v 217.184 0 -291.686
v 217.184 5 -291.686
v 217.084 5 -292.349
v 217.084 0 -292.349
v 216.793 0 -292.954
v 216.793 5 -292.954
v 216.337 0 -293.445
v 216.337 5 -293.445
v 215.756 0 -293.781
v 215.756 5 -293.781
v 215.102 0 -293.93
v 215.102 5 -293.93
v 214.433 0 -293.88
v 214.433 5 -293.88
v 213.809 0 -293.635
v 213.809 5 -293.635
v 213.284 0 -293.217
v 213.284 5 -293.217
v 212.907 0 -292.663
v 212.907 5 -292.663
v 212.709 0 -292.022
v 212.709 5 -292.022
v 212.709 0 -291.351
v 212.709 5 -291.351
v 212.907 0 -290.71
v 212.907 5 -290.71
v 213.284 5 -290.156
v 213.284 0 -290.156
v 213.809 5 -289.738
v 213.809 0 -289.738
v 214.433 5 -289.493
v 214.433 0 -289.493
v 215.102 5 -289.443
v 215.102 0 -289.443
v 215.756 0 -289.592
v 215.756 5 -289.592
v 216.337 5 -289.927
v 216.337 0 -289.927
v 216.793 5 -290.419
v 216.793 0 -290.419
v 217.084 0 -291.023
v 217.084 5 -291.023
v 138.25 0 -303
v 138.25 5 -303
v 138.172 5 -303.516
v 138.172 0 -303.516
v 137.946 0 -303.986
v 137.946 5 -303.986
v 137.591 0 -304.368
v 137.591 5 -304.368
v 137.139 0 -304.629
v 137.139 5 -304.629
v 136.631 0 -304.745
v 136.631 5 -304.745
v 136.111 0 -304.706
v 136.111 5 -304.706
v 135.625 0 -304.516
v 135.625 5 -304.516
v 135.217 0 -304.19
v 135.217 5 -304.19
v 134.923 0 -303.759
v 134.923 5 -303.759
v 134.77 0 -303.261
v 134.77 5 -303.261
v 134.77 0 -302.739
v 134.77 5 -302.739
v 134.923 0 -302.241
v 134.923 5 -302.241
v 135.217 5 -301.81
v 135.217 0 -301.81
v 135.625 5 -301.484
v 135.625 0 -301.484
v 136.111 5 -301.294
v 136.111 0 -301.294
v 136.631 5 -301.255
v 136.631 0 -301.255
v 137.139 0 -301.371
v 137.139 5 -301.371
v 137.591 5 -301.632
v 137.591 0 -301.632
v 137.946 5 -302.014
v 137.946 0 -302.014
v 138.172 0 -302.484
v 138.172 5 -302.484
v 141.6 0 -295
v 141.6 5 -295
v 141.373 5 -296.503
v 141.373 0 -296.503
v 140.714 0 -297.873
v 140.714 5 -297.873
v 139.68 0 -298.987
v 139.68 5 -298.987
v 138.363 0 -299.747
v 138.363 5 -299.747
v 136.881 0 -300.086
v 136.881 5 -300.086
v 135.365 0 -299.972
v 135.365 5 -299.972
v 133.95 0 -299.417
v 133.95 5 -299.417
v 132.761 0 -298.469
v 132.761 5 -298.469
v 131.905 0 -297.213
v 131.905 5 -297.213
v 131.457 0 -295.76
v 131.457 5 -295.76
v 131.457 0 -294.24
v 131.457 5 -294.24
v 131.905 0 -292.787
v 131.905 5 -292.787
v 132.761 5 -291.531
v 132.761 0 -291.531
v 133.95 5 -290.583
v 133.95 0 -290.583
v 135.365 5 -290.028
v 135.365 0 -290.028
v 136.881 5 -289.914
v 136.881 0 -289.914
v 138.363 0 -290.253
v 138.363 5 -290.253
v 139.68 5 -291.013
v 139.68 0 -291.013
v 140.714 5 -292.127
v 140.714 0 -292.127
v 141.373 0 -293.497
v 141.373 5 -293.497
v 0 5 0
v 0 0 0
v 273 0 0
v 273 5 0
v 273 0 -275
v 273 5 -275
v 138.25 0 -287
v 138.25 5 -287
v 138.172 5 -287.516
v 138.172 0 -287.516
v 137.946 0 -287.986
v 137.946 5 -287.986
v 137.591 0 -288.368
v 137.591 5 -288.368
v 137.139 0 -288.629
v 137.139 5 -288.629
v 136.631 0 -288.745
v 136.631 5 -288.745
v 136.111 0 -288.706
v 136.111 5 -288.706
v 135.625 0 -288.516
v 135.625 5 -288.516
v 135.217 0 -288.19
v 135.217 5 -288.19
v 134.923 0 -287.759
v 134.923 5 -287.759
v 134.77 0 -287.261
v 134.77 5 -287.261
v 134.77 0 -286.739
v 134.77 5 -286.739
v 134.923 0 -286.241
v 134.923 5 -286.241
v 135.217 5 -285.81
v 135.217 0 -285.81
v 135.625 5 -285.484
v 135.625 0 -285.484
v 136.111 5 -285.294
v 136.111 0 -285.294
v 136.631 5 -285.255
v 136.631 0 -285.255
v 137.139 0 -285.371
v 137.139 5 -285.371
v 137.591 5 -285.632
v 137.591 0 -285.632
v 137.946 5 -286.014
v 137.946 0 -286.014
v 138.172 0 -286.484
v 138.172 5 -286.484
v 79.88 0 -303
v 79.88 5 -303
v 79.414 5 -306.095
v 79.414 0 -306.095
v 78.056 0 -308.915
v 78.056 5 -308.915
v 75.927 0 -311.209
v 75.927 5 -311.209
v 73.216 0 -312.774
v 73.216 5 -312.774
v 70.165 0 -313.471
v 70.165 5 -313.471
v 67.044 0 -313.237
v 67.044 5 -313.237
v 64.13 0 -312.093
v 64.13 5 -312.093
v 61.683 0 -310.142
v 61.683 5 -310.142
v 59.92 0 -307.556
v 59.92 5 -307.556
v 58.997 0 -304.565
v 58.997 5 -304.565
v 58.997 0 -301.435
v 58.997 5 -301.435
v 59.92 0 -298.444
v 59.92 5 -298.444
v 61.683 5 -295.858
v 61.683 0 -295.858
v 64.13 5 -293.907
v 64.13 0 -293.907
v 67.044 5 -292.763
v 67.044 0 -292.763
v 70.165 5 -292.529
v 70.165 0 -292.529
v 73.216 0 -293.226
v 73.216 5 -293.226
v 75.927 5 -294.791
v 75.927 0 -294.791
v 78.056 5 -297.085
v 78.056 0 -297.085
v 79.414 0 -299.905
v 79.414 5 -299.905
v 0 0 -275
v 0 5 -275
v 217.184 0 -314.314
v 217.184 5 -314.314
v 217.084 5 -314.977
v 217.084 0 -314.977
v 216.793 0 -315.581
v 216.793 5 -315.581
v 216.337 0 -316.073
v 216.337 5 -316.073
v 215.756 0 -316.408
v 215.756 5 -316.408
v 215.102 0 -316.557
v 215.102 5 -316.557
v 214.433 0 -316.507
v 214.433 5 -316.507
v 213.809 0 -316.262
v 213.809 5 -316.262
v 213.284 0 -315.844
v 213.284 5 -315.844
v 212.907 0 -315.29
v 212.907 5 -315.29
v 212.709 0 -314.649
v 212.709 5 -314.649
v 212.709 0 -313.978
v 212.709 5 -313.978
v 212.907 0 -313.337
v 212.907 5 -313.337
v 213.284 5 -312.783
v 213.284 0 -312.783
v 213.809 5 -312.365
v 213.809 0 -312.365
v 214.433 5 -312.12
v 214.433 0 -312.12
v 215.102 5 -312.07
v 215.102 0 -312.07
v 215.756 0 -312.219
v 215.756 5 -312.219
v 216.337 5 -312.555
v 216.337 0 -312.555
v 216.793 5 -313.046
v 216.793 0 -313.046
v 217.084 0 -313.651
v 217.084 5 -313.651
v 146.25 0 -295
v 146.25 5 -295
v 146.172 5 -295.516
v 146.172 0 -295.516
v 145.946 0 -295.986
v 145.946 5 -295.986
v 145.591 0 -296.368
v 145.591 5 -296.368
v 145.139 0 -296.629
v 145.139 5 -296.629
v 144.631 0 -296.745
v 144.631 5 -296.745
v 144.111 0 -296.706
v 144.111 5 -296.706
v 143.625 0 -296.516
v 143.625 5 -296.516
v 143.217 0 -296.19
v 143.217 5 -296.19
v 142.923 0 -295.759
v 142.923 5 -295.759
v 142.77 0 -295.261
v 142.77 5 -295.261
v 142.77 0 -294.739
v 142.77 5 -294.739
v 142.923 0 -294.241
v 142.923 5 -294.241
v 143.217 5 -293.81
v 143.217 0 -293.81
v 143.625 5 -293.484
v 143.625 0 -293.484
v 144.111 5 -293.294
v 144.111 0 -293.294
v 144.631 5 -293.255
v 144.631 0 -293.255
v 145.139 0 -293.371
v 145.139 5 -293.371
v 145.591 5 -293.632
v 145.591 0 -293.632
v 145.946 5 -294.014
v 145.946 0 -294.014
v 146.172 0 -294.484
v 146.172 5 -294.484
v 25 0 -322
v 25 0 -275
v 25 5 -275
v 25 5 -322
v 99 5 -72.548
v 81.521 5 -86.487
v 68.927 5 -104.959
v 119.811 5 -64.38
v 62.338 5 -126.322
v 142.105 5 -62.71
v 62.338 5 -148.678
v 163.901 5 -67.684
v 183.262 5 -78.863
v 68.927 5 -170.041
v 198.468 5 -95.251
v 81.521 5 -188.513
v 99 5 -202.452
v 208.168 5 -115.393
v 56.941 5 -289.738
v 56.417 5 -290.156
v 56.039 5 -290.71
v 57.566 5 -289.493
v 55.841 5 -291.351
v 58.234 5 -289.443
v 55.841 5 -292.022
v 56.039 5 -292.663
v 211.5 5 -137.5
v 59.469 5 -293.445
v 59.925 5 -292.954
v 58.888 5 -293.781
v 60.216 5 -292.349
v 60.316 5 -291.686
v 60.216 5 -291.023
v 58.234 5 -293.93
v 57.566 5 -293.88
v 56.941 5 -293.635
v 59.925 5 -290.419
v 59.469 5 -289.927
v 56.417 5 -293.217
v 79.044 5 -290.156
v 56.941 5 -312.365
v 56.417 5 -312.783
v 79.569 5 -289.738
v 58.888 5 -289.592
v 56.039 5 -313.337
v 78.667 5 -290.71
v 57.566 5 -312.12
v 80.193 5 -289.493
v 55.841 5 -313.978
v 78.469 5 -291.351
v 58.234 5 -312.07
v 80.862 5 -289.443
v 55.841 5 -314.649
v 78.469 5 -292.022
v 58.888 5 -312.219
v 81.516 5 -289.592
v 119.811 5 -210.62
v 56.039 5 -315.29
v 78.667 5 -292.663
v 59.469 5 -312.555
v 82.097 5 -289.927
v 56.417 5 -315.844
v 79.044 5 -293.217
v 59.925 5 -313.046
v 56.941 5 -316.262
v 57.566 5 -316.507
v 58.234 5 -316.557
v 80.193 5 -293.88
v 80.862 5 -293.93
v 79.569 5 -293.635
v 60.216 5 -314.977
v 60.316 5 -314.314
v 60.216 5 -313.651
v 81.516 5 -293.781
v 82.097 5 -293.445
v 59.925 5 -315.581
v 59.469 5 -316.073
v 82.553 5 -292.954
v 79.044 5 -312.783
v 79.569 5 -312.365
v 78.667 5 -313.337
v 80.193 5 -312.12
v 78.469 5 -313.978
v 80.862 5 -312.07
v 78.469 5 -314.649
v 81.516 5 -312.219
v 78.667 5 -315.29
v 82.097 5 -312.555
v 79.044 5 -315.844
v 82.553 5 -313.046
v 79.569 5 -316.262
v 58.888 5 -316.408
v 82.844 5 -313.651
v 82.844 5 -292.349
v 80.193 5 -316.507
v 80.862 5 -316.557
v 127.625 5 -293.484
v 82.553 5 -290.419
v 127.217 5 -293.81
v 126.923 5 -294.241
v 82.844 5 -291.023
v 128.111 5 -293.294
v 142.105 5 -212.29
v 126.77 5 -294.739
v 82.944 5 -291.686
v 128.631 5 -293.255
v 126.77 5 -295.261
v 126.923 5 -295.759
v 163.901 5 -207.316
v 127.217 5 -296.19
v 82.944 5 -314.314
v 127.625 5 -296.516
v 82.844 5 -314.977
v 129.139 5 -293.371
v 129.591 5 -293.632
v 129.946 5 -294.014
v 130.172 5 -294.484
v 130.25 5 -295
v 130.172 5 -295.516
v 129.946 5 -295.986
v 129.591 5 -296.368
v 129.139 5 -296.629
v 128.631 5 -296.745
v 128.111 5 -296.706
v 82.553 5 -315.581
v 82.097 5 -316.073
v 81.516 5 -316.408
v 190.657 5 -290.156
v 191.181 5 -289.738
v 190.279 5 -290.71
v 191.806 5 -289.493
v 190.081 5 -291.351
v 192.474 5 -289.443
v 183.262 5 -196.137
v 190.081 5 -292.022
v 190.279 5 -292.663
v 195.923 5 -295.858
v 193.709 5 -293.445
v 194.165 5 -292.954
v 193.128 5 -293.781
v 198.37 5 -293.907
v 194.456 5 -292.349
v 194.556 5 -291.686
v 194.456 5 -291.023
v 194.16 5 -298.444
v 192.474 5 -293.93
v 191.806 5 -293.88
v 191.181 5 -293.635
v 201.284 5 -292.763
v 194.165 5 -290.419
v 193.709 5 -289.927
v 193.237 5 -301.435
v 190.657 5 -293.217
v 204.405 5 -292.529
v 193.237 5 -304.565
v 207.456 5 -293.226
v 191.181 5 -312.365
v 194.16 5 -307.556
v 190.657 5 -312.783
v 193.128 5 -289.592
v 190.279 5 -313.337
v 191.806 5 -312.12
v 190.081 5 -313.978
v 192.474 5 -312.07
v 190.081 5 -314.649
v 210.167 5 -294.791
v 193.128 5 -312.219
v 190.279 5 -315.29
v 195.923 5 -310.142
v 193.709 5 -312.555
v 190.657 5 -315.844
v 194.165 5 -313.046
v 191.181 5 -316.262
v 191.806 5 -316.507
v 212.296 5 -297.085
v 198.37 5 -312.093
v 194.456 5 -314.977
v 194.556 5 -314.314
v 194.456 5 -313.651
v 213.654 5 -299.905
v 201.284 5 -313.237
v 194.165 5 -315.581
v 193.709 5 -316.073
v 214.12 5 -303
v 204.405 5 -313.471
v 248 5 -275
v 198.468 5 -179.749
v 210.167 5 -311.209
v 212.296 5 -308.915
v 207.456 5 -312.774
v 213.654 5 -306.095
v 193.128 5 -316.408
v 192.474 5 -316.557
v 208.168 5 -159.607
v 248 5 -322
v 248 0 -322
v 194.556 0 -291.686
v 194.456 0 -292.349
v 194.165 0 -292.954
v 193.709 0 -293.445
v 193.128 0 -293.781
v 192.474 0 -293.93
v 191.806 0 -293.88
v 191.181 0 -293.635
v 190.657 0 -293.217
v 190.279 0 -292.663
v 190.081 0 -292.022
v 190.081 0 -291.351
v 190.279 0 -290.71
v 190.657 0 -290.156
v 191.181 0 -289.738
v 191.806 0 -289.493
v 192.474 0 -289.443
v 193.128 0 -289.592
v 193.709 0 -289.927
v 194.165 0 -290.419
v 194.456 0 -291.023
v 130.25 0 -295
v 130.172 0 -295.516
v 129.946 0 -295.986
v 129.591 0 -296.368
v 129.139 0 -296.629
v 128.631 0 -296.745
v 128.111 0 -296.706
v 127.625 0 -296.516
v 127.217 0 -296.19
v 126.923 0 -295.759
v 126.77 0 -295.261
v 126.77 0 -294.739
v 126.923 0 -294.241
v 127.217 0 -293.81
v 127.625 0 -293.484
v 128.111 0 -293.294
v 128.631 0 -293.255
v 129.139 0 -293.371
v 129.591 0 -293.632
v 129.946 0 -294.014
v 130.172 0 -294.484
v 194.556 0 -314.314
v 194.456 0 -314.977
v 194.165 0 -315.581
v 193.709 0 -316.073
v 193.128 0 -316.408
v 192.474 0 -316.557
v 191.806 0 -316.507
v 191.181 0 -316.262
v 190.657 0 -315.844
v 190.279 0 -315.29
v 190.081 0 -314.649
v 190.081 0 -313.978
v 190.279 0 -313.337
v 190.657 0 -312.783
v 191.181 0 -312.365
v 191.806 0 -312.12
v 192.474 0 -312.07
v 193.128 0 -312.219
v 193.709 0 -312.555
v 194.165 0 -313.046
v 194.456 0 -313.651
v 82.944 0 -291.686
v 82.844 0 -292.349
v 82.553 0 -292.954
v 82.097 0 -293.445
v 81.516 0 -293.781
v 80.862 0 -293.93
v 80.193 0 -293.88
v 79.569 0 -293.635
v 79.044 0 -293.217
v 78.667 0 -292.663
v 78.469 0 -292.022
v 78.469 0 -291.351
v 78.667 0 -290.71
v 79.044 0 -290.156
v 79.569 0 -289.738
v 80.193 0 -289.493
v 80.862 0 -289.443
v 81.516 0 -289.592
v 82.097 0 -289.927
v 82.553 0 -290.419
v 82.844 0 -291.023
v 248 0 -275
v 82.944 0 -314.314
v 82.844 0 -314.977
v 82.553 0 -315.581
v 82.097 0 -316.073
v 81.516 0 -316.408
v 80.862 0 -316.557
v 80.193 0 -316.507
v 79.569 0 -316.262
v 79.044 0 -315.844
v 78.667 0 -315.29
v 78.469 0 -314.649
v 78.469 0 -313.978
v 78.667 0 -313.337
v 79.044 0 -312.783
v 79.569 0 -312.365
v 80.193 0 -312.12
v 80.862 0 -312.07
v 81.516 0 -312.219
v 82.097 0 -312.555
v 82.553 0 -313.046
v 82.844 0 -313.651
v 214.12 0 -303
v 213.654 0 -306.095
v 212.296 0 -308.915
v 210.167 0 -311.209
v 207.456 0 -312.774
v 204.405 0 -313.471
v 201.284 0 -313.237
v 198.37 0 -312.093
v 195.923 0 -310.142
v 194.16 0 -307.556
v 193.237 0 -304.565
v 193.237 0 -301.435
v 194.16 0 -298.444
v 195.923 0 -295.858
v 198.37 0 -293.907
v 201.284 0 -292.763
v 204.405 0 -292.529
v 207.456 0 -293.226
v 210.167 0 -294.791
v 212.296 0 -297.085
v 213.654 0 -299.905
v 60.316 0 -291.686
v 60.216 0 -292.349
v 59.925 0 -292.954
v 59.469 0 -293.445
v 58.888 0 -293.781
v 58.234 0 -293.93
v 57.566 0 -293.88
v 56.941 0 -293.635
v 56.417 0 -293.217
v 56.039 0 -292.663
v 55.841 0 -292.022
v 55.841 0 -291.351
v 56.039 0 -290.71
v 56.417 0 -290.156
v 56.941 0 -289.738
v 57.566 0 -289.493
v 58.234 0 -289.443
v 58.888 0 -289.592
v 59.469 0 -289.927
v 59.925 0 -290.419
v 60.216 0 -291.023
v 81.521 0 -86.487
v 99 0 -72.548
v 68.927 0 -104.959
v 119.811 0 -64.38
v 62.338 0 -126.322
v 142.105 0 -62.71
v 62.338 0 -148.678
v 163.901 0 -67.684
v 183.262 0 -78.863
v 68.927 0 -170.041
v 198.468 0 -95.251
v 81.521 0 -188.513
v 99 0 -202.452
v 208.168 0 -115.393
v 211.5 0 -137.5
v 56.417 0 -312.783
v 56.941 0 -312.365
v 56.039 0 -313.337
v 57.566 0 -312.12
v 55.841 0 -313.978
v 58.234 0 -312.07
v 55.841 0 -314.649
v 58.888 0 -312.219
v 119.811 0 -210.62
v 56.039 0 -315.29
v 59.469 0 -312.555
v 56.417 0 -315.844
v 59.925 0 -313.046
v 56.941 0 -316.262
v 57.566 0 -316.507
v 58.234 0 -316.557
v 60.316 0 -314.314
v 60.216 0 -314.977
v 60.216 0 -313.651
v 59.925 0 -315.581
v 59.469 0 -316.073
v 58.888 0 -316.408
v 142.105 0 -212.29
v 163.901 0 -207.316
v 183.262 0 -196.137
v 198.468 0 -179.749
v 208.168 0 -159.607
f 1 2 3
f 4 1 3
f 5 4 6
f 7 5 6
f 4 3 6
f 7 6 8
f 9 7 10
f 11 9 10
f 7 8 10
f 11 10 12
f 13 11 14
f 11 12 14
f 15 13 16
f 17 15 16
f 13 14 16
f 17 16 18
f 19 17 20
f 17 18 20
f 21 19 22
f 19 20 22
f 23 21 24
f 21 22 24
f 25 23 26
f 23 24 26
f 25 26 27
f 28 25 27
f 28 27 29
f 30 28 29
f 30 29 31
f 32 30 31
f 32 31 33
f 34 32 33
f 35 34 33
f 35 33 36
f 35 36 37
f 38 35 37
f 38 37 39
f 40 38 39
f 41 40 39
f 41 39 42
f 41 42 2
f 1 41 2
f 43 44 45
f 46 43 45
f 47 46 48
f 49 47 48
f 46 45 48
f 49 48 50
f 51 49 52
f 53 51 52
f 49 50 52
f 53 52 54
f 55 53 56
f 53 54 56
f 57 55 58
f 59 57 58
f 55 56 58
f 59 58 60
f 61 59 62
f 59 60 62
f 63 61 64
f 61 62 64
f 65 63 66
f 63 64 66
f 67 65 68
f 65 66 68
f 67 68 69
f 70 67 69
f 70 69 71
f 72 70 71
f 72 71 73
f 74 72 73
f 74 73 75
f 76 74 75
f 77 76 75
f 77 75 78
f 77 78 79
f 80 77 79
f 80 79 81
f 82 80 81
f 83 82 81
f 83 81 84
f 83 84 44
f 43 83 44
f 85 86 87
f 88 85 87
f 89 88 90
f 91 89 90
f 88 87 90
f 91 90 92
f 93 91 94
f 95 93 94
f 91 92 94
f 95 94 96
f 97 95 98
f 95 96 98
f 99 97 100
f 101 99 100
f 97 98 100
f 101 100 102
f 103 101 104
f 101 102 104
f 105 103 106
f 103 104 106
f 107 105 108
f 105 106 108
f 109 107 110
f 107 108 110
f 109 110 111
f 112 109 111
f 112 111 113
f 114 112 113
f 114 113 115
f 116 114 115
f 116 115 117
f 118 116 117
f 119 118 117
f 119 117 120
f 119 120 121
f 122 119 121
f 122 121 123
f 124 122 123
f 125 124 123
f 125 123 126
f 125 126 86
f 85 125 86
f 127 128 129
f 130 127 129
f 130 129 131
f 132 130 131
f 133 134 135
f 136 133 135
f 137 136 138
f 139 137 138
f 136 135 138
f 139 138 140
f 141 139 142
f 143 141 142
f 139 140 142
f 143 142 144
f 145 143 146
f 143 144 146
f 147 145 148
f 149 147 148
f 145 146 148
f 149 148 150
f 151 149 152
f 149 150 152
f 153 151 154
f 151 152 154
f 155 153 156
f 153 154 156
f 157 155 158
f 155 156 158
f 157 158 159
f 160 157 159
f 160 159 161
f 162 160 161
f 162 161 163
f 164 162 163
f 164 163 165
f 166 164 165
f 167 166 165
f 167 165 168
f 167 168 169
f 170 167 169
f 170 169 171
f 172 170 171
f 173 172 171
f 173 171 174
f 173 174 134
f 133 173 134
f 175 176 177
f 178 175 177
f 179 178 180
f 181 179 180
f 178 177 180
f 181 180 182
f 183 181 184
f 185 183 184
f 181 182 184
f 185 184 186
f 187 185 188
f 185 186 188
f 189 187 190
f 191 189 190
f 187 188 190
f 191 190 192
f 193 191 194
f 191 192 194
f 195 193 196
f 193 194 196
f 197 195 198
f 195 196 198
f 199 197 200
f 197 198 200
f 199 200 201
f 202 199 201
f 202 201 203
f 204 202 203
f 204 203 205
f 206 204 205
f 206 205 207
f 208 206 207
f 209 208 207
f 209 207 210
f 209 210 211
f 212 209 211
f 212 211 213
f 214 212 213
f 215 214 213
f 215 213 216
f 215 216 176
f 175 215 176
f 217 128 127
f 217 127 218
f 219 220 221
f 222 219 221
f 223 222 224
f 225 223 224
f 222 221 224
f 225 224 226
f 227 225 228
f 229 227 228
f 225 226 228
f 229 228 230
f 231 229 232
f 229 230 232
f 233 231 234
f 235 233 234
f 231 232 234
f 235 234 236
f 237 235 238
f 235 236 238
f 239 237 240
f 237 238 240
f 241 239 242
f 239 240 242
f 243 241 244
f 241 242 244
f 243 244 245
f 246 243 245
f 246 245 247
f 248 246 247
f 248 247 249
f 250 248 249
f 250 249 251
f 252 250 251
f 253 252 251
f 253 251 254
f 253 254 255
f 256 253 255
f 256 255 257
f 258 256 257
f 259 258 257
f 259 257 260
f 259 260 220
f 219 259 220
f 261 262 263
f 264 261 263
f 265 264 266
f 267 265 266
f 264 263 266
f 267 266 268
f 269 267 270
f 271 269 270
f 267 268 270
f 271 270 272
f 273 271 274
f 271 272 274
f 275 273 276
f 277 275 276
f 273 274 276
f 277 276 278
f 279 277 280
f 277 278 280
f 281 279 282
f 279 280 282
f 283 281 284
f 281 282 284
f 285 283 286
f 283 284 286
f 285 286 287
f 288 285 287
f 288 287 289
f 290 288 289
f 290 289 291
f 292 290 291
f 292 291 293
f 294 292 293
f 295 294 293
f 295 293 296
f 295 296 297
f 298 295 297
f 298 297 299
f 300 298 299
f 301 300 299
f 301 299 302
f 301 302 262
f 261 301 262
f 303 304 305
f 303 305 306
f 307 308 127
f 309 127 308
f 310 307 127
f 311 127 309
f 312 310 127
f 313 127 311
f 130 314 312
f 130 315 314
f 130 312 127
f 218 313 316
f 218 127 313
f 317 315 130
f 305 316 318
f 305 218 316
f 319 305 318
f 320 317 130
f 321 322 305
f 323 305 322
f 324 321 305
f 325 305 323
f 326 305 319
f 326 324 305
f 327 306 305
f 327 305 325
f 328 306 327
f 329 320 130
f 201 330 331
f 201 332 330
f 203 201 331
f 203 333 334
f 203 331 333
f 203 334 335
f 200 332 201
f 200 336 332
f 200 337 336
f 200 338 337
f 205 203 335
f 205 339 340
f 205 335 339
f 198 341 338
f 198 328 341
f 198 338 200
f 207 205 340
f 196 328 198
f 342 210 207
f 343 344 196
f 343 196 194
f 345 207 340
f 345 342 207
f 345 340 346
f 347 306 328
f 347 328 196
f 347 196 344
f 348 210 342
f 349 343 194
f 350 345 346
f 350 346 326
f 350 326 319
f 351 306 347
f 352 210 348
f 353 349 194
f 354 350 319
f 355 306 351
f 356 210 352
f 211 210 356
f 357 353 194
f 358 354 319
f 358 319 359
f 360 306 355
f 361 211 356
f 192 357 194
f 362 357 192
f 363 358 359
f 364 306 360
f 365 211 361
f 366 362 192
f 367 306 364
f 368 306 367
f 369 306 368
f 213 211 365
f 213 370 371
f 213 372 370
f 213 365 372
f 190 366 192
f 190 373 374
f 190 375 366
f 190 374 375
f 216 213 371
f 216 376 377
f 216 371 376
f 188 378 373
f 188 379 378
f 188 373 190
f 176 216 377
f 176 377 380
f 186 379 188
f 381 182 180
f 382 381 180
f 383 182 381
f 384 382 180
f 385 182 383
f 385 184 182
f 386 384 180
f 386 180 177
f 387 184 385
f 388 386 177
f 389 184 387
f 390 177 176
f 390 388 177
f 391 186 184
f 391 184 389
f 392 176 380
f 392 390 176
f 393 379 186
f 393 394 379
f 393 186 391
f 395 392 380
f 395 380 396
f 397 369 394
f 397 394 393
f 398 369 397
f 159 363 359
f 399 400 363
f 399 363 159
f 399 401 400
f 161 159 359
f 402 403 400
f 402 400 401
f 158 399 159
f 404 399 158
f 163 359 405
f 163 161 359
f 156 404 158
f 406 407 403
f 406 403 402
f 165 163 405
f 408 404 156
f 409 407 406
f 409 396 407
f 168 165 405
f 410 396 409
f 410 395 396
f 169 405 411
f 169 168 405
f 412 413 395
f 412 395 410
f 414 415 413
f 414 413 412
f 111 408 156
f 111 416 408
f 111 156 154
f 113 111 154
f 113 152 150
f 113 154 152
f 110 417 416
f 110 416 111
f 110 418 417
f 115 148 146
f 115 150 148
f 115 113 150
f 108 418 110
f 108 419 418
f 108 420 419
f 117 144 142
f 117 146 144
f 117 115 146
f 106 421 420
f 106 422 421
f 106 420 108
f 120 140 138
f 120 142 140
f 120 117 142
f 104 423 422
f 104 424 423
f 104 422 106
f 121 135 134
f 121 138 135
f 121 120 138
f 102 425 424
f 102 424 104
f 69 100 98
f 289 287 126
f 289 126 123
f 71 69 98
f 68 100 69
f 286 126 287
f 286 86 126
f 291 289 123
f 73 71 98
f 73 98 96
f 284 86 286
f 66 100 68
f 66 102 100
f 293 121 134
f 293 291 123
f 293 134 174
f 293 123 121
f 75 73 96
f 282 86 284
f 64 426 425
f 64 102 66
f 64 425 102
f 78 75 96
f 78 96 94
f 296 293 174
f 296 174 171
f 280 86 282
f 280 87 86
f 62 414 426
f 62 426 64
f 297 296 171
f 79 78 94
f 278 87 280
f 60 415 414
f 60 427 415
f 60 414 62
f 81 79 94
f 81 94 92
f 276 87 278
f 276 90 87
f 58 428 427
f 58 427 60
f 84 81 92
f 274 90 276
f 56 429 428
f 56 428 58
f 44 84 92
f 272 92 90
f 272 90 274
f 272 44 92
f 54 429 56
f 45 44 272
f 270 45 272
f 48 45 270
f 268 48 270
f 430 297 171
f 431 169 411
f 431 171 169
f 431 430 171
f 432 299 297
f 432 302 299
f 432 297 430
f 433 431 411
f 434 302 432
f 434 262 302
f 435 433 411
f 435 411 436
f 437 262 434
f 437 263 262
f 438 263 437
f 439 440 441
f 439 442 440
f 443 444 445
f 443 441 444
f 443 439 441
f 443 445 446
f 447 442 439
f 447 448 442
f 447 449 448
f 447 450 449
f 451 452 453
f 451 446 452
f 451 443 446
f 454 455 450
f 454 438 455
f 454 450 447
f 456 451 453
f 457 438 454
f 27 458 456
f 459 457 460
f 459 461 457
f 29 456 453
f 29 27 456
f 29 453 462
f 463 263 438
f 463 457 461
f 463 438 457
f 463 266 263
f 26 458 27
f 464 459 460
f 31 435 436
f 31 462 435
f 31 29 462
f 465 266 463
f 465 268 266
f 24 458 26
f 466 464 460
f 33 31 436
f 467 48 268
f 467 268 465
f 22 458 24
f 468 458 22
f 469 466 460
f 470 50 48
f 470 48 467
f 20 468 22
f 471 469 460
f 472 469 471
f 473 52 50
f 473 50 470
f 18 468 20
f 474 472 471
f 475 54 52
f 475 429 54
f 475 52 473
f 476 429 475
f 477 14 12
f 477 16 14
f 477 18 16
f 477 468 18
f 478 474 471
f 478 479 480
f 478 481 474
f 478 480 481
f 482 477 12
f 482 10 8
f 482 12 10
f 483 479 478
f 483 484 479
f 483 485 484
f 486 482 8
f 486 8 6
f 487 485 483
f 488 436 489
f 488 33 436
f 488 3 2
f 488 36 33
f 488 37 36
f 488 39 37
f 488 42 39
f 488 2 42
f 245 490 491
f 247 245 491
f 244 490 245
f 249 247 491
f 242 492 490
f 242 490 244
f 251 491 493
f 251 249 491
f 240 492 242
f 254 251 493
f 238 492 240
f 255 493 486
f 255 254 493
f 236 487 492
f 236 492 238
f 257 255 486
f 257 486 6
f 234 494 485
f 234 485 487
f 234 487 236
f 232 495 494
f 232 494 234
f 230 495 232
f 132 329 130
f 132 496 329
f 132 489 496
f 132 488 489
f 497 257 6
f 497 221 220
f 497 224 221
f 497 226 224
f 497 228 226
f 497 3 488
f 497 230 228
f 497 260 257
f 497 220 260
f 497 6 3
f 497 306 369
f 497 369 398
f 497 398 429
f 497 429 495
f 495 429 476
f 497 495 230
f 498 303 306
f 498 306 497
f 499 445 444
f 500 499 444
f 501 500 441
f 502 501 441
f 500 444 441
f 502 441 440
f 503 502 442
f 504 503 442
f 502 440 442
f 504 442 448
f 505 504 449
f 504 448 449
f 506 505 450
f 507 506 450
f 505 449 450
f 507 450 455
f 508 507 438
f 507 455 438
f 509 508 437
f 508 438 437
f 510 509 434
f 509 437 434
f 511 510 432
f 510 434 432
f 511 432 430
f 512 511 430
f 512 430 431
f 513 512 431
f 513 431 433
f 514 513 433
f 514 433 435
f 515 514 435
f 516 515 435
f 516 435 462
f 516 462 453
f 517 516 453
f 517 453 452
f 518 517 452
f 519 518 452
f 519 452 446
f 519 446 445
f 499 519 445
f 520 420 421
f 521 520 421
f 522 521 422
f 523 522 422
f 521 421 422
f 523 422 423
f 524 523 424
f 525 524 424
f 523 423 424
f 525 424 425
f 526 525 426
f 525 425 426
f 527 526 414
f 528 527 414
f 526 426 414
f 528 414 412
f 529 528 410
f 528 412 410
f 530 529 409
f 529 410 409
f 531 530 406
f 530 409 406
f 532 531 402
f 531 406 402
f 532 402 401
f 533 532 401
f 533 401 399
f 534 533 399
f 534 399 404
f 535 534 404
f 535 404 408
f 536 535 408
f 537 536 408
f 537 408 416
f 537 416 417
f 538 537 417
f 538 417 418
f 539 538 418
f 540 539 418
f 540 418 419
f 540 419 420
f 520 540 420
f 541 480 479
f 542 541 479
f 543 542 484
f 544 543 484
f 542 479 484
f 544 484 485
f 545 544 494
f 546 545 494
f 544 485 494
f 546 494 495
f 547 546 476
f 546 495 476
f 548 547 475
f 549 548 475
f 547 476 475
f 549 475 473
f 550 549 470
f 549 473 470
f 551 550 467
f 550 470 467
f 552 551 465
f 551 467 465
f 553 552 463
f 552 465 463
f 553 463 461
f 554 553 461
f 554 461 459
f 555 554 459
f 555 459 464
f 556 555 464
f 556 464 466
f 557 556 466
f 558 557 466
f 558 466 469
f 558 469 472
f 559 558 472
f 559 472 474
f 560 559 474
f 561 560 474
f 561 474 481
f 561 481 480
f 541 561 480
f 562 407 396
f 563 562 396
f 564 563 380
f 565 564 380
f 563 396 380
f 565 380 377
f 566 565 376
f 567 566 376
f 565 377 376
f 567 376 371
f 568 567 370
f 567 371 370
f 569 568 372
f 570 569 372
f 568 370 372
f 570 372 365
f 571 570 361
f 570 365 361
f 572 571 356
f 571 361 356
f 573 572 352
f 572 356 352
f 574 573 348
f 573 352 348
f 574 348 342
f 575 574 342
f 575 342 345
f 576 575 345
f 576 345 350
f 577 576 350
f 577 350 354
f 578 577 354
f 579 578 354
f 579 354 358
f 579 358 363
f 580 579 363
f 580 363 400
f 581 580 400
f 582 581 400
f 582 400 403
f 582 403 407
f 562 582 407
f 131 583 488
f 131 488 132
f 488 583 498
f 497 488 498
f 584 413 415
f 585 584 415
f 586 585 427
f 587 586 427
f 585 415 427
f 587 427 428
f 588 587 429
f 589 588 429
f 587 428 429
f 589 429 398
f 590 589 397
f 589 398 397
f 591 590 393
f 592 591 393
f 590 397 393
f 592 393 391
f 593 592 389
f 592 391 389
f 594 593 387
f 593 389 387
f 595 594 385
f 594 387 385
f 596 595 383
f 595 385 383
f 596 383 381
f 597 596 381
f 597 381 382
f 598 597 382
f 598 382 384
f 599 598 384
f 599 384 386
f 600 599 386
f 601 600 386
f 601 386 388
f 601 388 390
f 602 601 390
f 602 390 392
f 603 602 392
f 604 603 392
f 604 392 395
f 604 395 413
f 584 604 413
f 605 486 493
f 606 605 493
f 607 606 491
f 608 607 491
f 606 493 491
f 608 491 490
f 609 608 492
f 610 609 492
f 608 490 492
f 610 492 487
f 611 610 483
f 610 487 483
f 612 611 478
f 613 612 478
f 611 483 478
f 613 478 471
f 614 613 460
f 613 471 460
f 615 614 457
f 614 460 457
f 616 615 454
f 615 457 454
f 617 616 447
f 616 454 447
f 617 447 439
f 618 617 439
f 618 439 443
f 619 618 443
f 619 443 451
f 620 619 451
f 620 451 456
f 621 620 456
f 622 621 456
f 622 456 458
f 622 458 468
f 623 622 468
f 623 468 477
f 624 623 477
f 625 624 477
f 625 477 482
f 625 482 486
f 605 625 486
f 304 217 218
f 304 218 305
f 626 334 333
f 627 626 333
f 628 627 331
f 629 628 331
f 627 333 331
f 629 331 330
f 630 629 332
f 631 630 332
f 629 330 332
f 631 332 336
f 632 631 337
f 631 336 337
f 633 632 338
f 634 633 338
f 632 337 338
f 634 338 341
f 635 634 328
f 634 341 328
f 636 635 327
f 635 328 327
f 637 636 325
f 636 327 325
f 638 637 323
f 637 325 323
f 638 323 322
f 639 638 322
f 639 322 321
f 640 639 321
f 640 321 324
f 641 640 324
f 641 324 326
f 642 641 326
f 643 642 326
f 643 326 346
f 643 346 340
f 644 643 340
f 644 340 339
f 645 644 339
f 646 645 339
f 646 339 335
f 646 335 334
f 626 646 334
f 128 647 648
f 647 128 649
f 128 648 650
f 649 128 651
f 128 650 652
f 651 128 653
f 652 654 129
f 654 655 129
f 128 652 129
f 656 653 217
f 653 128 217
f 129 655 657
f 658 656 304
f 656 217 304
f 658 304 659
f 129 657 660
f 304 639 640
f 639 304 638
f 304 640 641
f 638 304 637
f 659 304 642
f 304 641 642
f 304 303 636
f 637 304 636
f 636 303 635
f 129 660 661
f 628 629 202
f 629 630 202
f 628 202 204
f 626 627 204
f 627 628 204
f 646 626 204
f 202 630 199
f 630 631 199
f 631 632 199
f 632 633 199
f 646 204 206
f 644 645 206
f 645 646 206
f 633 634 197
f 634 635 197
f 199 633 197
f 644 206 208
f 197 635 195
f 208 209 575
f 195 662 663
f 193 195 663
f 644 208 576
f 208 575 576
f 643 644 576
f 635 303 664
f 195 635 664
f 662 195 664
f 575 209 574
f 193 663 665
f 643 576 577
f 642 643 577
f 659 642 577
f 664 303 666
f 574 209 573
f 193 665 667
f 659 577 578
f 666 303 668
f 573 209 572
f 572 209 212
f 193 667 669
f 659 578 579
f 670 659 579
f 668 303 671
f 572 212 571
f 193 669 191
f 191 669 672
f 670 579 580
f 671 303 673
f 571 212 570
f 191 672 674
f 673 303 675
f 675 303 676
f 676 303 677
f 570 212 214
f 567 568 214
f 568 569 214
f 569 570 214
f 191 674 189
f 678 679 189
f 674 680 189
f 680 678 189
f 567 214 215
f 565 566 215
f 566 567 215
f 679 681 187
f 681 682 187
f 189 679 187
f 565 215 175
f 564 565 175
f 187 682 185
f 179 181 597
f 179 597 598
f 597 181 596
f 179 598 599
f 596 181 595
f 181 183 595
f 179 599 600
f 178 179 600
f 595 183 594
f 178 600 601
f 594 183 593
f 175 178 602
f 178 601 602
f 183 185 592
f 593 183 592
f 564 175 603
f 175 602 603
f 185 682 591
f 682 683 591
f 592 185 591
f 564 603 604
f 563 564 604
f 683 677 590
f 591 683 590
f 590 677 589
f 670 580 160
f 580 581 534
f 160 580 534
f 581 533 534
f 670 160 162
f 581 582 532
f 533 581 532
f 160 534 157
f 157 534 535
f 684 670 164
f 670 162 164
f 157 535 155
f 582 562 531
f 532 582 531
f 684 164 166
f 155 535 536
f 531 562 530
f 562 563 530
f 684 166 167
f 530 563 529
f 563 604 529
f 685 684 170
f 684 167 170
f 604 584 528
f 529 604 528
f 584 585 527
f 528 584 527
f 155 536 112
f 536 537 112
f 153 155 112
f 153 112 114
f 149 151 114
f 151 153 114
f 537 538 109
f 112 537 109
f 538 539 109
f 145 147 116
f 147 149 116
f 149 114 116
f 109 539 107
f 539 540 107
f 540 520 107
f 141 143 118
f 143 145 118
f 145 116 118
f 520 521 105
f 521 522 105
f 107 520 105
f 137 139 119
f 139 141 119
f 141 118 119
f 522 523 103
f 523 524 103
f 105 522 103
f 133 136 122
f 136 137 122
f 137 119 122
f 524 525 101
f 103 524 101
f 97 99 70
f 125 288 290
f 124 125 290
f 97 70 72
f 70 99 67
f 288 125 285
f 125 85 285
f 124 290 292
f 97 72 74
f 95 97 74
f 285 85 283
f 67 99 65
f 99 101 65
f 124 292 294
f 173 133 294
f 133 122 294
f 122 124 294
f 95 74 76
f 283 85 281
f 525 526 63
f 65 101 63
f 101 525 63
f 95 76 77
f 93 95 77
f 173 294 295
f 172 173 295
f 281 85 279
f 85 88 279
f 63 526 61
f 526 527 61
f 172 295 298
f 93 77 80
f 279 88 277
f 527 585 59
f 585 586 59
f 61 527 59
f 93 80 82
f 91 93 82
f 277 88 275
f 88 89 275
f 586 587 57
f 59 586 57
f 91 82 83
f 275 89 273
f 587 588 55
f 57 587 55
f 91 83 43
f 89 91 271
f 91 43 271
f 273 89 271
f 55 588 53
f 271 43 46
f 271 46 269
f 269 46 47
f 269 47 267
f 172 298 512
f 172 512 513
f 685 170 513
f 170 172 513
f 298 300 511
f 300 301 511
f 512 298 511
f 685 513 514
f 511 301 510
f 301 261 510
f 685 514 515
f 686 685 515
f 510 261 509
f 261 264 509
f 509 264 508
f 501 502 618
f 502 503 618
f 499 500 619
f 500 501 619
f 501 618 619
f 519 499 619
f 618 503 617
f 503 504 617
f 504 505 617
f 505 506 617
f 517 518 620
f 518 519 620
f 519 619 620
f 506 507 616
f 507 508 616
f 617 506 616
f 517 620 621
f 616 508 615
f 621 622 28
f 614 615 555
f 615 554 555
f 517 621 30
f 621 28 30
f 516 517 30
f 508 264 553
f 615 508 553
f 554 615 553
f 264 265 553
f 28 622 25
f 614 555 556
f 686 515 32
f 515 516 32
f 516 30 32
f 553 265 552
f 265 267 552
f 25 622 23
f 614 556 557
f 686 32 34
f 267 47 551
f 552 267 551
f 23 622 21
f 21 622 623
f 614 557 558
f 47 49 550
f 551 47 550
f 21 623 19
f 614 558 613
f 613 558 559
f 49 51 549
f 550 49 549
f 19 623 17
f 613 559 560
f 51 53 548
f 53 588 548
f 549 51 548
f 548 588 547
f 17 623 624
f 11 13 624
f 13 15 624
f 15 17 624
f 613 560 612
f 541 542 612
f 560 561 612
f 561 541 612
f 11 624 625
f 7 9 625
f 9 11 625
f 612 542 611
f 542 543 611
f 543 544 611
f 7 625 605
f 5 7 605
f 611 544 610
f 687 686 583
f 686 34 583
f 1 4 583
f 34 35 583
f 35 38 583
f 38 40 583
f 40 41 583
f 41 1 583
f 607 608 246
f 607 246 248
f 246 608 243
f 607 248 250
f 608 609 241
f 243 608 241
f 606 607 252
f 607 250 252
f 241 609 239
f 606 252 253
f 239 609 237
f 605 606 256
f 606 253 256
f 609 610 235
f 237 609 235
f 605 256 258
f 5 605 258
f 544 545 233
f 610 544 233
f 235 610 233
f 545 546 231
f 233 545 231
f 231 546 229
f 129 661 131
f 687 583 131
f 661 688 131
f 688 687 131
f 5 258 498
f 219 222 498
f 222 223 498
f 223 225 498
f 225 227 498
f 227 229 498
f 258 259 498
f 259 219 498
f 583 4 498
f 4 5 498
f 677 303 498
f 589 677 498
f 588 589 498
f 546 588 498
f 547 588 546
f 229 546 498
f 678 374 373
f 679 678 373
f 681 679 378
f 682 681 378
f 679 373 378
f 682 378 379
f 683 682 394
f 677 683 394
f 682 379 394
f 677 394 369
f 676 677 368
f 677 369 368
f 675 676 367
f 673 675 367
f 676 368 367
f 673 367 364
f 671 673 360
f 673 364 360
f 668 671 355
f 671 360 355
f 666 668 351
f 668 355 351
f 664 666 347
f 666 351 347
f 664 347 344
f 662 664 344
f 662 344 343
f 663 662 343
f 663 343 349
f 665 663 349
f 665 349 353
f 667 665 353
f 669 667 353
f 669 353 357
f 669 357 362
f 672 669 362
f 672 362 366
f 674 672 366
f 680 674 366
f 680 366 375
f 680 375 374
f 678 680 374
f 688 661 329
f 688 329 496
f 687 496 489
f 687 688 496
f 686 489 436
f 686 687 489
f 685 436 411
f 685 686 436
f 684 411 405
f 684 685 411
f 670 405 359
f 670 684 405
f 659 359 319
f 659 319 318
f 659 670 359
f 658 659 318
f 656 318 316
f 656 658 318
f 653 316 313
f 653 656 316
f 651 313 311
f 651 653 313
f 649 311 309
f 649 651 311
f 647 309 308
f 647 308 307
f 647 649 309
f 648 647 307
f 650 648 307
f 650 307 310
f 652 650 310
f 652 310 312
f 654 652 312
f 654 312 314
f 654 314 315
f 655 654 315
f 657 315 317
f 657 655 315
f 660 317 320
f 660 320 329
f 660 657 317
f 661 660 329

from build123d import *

# Parameters (mm, degrees)
SKETCH1_W           = 273
SKETCH1_H           = 275
SKETCH1_R           = 75
SKETCH1_W_2         = 223
SKETCH1_H_2         = 47
BOSS_EXTRUDE1_DEPTH = 5
SKETCH2_R           = 5.1
SKETCH2_R_2         = 1.75
SKETCH2_R_3         = 10.5
SKETCH2_R_4         = 2.25
CUT_EXTRUDE1_DEPTH  = 10


with BuildPart() as part:
    # Sketch1 → Boss-Extrude1 (new body)
    with BuildSketch(Plane(origin=(0, 0, 0), x_dir=(1, 0, 0), z_dir=(0, 1, 0))):
        with Locations((136.5, 137.5)):
            Rectangle(SKETCH1_W, SKETCH1_H)
        with Locations((136.5, 137.5)):
            Circle(SKETCH1_R, mode=Mode.SUBTRACT)
        with Locations((136.5, 298.5)):
            Rectangle(SKETCH1_W_2, SKETCH1_H_2)
    extrude(amount=BOSS_EXTRUDE1_DEPTH)

    # Sketch2 → Cut-Extrude1 (cut)
    with BuildSketch(Plane(origin=(0, 5, 0), x_dir=(1, 0, 0), z_dir=(0, 1, 0))):
        with Locations((136.5, 295)):
            Circle(SKETCH2_R)
        with Locations((136.5, 303)):
            Circle(SKETCH2_R_2)
        with Locations((136.5, 287)):
            Circle(SKETCH2_R_2)
        with Locations((128.5, 295)):
            Circle(SKETCH2_R_2)
        with Locations((144.5, 295)):
            Circle(SKETCH2_R_2)
        with Locations((69.38, 303)):
            Circle(SKETCH2_R_3)
        with Locations((80.693708499, 314.313708499)):
            Circle(SKETCH2_R_4)
        with Locations((58.066291501, 314.313708499)):
            Circle(SKETCH2_R_4)
        with Locations((80.693708499, 291.686291501)):
            Circle(SKETCH2_R_4)
        with Locations((58.066291501, 291.686291501)):
            Circle(SKETCH2_R_4)
        with Locations((203.62, 303)):
            Circle(SKETCH2_R_3)
        with Locations((214.933708499, 291.686291501)):
            Circle(SKETCH2_R_4)
        with Locations((192.306291501, 291.686291501)):
            Circle(SKETCH2_R_4)
        with Locations((192.306291501, 314.313708499)):
            Circle(SKETCH2_R_4)
        with Locations((214.933708499, 314.313708499)):
            Circle(SKETCH2_R_4)
    extrude(amount=-CUT_EXTRUDE1_DEPTH, mode=Mode.SUBTRACT)


solid = part.part
